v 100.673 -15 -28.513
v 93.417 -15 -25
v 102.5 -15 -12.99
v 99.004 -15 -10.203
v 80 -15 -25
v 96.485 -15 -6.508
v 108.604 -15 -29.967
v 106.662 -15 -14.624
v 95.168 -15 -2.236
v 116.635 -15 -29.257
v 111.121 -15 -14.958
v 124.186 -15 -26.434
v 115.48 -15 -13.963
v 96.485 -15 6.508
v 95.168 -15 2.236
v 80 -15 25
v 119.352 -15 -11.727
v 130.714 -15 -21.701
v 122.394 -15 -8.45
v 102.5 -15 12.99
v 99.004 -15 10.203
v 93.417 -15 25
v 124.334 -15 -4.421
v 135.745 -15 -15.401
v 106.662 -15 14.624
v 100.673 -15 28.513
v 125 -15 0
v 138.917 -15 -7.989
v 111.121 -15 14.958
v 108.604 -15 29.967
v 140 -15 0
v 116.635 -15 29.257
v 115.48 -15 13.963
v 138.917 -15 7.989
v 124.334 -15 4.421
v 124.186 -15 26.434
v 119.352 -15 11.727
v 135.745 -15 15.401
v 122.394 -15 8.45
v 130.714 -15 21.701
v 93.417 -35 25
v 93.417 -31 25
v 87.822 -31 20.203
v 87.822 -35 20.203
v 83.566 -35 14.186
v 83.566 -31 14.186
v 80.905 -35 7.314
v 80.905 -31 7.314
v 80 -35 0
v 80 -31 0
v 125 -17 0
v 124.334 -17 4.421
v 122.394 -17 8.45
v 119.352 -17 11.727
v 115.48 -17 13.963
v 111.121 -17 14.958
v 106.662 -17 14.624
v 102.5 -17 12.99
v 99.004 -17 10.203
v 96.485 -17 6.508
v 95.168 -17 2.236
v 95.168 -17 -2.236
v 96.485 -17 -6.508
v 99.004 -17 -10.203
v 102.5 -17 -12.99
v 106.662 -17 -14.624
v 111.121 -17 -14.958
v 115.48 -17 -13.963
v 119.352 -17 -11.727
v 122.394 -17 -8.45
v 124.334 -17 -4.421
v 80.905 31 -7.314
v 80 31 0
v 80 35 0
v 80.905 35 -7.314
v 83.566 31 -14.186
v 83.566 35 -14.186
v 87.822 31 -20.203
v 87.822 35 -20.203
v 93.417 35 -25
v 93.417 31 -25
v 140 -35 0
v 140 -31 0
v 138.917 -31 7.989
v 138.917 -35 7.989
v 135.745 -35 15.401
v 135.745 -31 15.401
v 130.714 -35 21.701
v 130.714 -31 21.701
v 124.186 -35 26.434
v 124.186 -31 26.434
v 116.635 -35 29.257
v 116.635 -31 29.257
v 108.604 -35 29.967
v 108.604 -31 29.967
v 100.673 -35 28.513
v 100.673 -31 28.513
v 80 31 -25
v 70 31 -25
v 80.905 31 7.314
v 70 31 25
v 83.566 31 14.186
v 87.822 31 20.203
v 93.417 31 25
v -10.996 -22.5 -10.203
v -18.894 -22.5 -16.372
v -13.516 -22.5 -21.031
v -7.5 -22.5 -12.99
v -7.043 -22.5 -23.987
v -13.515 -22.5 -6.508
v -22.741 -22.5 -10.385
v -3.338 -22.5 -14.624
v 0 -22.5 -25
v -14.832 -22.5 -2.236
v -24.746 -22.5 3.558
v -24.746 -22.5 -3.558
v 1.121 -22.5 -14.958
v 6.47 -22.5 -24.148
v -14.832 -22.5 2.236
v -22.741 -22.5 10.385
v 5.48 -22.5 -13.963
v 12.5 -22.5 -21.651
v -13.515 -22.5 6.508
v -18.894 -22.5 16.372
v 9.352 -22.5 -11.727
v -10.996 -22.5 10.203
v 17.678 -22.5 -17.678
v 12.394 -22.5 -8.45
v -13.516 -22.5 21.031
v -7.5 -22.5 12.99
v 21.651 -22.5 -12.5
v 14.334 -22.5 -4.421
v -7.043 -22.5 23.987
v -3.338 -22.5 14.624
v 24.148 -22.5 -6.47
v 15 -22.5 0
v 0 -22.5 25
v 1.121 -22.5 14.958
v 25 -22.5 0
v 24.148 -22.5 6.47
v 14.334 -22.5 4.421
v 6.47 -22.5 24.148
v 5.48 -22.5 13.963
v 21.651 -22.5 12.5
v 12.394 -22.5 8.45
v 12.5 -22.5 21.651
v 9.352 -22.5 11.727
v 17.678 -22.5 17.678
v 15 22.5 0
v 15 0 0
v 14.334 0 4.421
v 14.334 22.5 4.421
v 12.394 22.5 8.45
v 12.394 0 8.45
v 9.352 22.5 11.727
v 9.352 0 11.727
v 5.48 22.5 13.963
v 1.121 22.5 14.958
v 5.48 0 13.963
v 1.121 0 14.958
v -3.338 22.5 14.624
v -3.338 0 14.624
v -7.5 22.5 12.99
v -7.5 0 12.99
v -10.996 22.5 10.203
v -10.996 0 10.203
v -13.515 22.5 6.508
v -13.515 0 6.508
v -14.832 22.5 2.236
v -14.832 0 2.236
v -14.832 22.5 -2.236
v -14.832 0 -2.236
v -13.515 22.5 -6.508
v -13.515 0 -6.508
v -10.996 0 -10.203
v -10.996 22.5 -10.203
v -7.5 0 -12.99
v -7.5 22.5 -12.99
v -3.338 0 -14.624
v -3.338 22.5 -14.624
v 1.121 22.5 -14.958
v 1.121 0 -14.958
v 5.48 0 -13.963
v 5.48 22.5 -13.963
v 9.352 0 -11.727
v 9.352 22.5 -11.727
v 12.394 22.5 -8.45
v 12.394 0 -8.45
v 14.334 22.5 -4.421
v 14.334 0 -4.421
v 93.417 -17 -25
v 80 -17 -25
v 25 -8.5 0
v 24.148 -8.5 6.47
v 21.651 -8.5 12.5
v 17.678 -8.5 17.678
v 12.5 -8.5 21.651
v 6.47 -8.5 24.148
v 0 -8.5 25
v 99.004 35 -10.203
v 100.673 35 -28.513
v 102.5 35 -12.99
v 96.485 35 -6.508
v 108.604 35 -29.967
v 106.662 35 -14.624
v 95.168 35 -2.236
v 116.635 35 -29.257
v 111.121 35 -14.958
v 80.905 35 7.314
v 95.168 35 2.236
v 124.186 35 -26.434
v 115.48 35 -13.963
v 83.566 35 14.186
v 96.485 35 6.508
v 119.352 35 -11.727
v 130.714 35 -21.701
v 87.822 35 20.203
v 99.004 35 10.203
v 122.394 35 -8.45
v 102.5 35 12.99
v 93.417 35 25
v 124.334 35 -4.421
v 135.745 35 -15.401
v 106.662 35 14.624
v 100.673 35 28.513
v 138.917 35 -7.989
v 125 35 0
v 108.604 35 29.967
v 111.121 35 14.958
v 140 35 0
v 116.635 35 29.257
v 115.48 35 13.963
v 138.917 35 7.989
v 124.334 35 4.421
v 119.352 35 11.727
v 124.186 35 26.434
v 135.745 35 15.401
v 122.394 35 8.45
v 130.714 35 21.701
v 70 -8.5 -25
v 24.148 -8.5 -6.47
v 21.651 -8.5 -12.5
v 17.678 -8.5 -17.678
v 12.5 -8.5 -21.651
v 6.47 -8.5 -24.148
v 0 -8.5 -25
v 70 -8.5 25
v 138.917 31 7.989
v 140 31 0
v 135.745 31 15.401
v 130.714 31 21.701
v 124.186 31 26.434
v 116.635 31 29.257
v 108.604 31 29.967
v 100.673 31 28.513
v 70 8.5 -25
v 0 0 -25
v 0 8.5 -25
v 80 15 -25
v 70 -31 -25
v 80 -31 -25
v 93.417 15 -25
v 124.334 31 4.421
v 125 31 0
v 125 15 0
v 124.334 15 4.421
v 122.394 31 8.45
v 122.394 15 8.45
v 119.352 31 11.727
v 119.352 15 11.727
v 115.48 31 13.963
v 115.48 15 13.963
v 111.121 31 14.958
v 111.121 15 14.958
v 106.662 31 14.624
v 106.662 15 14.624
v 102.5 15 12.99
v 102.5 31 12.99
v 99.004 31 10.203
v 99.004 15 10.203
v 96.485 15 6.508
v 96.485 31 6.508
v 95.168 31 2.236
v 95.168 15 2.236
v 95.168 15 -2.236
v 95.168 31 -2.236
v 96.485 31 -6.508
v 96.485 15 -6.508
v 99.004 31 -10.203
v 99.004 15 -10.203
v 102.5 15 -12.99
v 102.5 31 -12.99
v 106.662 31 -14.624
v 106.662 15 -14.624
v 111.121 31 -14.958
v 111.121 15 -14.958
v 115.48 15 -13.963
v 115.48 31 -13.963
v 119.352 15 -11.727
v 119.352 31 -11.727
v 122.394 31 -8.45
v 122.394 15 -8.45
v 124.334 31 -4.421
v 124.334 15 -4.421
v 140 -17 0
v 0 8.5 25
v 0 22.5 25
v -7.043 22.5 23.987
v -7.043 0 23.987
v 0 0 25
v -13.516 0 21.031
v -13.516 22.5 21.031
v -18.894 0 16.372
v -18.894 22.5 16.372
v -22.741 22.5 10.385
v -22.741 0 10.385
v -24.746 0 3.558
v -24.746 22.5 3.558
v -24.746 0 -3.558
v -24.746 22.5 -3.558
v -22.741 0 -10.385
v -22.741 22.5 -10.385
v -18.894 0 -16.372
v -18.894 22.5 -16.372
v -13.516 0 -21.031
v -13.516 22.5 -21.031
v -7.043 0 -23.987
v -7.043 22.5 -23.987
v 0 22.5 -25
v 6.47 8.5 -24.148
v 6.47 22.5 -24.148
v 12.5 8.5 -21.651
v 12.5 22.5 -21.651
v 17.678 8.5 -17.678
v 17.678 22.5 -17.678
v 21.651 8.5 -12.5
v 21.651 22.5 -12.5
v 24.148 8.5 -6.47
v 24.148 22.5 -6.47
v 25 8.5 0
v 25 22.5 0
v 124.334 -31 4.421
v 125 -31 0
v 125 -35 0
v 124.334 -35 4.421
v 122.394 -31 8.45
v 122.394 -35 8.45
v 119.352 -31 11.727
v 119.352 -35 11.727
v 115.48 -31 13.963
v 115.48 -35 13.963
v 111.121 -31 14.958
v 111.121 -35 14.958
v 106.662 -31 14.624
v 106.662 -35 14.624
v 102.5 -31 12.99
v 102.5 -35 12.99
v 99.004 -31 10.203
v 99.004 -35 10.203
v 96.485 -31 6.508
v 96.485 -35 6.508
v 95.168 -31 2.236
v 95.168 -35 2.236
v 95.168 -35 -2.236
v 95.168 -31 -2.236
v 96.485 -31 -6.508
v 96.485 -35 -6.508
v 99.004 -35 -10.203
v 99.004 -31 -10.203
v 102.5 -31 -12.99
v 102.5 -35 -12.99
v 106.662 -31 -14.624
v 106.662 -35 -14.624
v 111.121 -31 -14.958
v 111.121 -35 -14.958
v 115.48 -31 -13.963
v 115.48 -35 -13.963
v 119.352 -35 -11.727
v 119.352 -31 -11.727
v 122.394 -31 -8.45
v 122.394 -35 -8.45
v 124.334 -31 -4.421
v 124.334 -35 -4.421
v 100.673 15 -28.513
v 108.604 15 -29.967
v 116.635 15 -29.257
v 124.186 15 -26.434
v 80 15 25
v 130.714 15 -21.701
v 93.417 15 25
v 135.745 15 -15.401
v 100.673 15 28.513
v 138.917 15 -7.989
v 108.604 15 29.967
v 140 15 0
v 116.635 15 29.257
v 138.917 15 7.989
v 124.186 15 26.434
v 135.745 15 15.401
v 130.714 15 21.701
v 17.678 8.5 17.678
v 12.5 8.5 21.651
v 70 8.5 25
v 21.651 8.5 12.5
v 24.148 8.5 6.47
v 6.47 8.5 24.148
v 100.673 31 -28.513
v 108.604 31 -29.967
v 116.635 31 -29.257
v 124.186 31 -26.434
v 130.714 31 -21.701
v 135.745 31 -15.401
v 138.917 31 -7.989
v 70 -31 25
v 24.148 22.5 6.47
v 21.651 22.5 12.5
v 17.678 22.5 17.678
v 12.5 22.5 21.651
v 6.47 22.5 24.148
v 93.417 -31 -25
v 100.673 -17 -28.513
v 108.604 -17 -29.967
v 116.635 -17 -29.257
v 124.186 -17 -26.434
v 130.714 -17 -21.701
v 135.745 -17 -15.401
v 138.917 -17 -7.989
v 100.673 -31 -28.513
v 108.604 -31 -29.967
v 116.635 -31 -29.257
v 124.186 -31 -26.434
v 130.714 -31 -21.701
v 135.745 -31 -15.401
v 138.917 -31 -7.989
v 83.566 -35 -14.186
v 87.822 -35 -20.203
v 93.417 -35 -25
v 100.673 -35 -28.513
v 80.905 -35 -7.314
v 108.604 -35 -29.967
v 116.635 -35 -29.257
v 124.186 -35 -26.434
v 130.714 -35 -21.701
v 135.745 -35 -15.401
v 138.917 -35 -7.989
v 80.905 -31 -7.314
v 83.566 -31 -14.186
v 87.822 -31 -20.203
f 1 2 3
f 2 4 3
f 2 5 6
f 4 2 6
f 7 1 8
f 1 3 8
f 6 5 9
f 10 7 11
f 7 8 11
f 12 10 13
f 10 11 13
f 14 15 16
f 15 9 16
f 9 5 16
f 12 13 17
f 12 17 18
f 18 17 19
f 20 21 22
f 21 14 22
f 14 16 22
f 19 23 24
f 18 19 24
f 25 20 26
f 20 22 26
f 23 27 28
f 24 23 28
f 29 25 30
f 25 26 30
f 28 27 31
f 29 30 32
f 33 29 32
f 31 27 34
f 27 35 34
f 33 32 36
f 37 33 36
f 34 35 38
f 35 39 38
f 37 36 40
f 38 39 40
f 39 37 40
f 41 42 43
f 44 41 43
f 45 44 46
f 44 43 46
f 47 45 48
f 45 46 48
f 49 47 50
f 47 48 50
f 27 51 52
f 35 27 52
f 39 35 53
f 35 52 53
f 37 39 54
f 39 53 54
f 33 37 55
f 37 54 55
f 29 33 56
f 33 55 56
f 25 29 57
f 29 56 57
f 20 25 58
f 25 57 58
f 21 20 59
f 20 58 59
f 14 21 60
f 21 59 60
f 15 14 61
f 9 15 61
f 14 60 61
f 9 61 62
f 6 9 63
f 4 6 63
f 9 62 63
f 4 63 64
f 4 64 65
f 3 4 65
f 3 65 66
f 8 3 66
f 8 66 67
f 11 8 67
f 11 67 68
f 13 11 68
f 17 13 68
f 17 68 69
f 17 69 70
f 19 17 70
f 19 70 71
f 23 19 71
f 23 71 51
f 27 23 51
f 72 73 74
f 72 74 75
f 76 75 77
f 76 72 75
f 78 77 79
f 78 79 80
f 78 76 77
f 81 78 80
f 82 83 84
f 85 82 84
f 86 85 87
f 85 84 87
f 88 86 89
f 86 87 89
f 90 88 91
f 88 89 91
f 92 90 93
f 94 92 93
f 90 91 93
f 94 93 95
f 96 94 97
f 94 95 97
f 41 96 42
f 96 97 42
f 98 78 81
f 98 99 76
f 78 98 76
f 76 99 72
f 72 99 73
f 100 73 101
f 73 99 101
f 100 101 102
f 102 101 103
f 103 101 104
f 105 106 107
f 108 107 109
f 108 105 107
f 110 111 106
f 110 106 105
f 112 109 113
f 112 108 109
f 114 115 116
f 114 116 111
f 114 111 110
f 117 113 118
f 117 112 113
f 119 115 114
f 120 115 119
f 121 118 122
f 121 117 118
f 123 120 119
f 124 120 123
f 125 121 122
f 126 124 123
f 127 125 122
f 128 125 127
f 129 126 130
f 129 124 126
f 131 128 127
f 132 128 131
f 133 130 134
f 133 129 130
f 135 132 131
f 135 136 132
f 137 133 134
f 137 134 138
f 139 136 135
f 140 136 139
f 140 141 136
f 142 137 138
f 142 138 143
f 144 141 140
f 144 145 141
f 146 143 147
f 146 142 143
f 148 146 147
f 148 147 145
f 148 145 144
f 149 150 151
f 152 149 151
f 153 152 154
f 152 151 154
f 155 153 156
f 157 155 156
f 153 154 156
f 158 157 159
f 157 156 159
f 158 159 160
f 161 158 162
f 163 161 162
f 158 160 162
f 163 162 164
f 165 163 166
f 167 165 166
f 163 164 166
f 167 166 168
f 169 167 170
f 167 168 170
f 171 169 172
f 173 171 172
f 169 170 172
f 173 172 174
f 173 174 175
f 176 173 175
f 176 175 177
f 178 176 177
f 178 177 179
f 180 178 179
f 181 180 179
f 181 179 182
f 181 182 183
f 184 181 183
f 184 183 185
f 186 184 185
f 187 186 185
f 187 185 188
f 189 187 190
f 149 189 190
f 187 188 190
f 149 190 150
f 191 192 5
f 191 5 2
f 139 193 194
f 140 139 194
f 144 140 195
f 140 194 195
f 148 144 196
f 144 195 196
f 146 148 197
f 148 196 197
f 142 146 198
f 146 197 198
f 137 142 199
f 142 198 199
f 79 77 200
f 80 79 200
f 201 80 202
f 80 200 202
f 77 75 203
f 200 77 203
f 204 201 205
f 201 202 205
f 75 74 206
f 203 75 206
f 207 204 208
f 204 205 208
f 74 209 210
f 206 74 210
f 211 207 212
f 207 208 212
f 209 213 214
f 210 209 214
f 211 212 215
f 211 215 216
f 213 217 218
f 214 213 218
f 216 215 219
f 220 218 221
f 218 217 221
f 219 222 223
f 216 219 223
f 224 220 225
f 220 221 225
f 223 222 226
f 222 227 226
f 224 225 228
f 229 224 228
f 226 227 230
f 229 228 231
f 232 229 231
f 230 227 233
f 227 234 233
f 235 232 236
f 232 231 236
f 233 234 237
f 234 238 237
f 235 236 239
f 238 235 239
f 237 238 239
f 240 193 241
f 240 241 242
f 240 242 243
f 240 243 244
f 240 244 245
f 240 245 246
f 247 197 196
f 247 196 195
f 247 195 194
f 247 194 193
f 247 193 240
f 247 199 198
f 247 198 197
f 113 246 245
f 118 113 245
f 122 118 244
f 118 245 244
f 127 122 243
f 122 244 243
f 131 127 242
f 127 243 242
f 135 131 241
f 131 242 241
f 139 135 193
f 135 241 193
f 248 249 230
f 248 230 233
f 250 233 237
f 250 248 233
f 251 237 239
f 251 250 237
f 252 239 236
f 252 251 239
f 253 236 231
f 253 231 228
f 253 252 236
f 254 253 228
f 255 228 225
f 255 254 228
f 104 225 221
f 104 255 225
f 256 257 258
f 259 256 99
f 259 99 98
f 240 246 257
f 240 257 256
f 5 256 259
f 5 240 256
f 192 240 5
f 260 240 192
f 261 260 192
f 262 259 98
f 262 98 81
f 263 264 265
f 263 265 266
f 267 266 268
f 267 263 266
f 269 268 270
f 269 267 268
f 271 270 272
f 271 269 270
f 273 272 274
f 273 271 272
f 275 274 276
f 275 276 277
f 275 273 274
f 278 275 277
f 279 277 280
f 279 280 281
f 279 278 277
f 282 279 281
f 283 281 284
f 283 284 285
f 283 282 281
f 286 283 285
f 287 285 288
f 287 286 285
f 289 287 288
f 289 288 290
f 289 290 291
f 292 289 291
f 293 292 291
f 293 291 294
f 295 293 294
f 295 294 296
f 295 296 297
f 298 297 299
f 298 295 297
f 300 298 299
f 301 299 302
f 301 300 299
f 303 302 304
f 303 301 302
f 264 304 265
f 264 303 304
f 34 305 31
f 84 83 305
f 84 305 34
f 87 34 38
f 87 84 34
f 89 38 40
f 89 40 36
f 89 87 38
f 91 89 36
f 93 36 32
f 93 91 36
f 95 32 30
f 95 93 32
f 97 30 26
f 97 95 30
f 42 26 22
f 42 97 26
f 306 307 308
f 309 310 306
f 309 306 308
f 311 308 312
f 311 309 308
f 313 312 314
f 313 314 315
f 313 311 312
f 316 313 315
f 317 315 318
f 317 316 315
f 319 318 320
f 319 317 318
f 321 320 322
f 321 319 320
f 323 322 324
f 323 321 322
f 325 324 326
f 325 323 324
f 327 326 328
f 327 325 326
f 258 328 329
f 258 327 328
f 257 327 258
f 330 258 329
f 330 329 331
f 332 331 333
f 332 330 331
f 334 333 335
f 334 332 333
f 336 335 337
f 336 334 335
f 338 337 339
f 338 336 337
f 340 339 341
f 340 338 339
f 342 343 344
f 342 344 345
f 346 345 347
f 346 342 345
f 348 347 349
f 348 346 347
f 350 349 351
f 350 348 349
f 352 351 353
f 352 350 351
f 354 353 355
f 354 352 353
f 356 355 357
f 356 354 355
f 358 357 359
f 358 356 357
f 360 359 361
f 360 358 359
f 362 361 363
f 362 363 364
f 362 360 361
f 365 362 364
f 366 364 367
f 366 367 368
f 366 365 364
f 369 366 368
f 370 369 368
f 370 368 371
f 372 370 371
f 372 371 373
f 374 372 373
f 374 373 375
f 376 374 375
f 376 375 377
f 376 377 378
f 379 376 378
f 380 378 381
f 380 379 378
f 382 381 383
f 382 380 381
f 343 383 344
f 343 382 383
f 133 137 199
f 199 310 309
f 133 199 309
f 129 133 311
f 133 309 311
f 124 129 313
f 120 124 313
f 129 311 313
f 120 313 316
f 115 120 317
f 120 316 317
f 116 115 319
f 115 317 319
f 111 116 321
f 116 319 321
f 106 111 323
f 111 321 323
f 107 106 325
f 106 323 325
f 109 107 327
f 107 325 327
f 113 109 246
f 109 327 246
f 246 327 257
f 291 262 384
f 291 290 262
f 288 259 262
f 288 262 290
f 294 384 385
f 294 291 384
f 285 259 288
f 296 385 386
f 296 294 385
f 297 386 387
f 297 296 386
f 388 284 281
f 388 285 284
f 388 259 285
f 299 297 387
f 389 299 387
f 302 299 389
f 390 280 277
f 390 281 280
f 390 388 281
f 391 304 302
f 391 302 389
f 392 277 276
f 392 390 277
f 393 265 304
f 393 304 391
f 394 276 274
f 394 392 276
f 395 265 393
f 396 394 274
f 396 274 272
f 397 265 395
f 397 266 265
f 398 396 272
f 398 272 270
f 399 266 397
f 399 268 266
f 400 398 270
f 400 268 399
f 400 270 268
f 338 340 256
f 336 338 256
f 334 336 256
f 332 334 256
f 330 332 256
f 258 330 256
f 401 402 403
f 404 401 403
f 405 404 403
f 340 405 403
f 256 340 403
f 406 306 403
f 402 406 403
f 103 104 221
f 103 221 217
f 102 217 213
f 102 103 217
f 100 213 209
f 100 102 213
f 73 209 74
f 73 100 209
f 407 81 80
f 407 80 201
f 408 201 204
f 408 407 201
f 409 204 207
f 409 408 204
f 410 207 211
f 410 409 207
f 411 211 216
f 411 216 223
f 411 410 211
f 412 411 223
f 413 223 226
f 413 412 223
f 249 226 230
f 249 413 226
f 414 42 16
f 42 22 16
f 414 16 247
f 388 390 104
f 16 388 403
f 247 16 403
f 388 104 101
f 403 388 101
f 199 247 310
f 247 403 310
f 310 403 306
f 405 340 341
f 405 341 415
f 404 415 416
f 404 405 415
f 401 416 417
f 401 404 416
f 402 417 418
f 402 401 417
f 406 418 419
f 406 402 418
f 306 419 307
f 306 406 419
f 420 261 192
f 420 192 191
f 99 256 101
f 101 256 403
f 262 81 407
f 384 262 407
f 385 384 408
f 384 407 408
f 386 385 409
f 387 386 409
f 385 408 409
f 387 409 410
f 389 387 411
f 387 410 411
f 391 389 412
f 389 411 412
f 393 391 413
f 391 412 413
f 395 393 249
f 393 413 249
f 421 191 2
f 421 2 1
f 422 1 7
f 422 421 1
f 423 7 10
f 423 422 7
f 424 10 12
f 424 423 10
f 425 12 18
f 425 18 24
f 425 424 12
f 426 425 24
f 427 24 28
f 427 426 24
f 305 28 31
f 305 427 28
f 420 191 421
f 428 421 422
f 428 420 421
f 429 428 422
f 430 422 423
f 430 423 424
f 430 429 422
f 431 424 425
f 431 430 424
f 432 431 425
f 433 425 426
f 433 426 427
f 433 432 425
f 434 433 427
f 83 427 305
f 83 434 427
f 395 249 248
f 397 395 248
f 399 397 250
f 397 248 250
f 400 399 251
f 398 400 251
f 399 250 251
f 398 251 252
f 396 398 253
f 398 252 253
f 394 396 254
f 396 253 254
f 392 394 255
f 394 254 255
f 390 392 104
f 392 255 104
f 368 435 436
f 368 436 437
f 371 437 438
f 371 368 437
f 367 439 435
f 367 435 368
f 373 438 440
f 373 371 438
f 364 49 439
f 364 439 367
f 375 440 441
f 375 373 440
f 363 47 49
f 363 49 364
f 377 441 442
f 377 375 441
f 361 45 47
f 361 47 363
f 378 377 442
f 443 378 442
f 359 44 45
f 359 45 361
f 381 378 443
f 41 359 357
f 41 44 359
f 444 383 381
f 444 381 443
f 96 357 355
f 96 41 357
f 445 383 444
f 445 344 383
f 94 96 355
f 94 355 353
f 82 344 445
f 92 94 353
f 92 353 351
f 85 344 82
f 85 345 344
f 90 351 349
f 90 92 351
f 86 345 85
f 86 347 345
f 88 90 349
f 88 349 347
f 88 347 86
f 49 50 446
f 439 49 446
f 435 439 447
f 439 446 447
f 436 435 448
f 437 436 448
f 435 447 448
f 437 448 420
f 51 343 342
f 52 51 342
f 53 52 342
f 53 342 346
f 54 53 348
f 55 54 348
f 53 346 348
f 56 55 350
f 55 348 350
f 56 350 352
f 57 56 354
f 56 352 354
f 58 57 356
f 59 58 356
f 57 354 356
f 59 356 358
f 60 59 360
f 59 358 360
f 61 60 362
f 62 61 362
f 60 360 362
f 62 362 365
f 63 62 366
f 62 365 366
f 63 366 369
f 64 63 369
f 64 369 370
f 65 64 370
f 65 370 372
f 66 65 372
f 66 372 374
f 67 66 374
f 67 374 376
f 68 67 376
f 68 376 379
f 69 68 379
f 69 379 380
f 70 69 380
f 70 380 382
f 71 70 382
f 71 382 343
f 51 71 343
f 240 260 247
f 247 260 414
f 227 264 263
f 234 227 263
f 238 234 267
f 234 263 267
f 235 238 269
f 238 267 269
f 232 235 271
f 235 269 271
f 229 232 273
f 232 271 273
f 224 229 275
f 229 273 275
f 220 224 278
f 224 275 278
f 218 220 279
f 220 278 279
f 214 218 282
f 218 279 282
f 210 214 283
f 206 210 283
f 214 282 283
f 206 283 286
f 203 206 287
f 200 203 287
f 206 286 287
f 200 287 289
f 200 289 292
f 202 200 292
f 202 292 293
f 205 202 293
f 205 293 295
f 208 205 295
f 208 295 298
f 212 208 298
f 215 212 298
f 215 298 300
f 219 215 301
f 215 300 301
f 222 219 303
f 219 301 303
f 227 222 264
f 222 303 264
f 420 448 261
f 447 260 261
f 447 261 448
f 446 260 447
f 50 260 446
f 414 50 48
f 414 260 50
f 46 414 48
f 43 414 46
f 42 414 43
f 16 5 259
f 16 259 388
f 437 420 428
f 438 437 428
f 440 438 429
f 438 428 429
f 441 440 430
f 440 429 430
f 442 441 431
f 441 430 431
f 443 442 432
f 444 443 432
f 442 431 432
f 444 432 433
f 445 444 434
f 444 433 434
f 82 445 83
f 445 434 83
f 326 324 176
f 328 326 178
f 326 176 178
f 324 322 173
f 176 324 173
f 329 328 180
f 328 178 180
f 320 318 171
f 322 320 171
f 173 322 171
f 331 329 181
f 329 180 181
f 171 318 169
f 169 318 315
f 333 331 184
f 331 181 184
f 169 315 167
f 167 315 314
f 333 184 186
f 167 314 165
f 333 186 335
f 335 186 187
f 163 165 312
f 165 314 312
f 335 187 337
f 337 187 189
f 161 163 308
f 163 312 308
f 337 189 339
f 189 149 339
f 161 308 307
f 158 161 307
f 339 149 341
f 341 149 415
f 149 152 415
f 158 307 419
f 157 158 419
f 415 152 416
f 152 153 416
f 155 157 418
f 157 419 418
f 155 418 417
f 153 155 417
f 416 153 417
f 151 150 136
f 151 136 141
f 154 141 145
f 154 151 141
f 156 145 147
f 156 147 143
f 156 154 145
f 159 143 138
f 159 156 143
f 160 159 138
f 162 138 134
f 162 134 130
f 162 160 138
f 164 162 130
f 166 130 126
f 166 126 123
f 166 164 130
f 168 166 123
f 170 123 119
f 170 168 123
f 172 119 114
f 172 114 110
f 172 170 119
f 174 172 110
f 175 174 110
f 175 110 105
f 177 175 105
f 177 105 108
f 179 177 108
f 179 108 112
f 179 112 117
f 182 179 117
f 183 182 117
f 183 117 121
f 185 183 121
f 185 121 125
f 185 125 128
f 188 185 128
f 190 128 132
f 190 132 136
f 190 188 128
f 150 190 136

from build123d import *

# Parameters (mm, degrees)
F0_R      = 15
F1_DEPTH  = 22.5
F2_DEPTH  = 8.5
F5_W      = 10
F5_H      = 50
F6_DEPTH  = 31
F8_R      = 15
F9_DEPTH  = 16
F10_DEPTH = 14
F12_DEPTH = 4


# Not quite as in the source:
# - a pattern or mirror of a feature is missing from the dataset's text; its kind, count and spacing are read off the source's solid


with BuildPart() as f1:
    # F0 (on Front) → F1 (new body, symmetric)
    with BuildSketch(Plane.XZ):
        with BuildLine():
            ThreePointArc((0, -25), (17.6776695297, -17.6776695297), (25, 0))
            ThreePointArc((25, 0), (17.6776695297, 17.6776695297), (0, 25))
            ThreePointArc((0, 25), (-25, 0), (0, -25))
        make_face()
        Circle(F0_R, mode=Mode.SUBTRACT)
    extrude(amount=F1_DEPTH, both=True)

    # F0 (on Front) → F2 (join, symmetric)
    with BuildSketch(Plane.XZ):
        with BuildLine():
            ThreePointArc((0, 25), (17.6776695297, 17.6776695297), (25, 0))
            ThreePointArc((25, 0), (17.6776695297, -17.6776695297), (0, -25))
            Line((0, -25), (70, -25))
            Line((70, -25), (70, 25))
            Line((70, 25), (0, 25))
        make_face()
    extrude(amount=F2_DEPTH, both=True)

    # F5 (on Front) → F6 (join, symmetric)
    with BuildSketch(Plane.XZ):
        with Locations((75, 0)):
            Rectangle(F5_W, F5_H)
    extrude(amount=F6_DEPTH, both=True)

    # F8 (on face) → F9 (join)
    with BuildSketch(Plane.XZ.offset(31)):
        with BuildLine():
            Line((93.4168760482, 25), (80, 25))
            Line((80, 25), (80, 0))
            ThreePointArc((80, 0), (83.5661796315, 14.1863716546), (93.4168760482, 25))
        make_face()
        with BuildLine():
            ThreePointArc((93.4168760482, 25), (83.5661796315, 14.1863716546), (80, 0))
            ThreePointArc((80, 0), (83.5661796315, -14.1863716546), (93.4168760482, -25))
            ThreePointArc((93.4168760482, -25), (124.1863716546, -26.4338203685), (140, 0))
            ThreePointArc((140, 0), (124.1863716546, 26.4338203685), (93.4168760482, 25))
        make_face()
        with Locations((110, 0)):
            Circle(F8_R, mode=Mode.SUBTRACT)
        with BuildLine():
            ThreePointArc((93.4168760482, -25), (83.5661796315, -14.1863716546), (80, 0))
            Line((80, 0), (80, -25))
            Line((80, -25), (93.4168760482, -25))
        make_face()
    f9 = extrude(amount=-F9_DEPTH)

    # F9_copies: F9 across plane
    add(f9.mirror(Plane.ZX))

    # F8 (on face) → F10 (join)
    with BuildSketch(Plane.XZ.offset(31)):
        with BuildLine():
            Line((93.4168760482, 25), (80, 25))
            Line((80, 25), (80, 0))
            ThreePointArc((80, 0), (83.5661796315, 14.1863716546), (93.4168760482, 25))
        make_face()
        with BuildLine():
            ThreePointArc((93.4168760482, -25), (83.5661796315, -14.1863716546), (80, 0))
            Line((80, 0), (80, -25))
            Line((80, -25), (93.4168760482, -25))
        make_face()
        with BuildLine():
            ThreePointArc((93.4168760482, 25), (83.5661796315, 14.1863716546), (80, 0))
            ThreePointArc((80, 0), (83.5661796315, -14.1863716546), (93.4168760482, -25))
            ThreePointArc((93.4168760482, -25), (124.1863716546, -26.4338203685), (140, 0))
            ThreePointArc((140, 0), (124.1863716546, 26.4338203685), (93.4168760482, 25))
        make_face()
        with Locations((110, 0)):
            Circle(F8_R, mode=Mode.SUBTRACT)
    extrude(amount=-F10_DEPTH)

    # F8 (on face) → F12 (join)
    with BuildSketch(Plane.XZ.offset(31)):
        with BuildLine():
            ThreePointArc((93.4168760482, 25), (83.5661796315, 14.1863716546), (80, 0))
            ThreePointArc((80, 0), (83.5661796315, -14.1863716546), (93.4168760482, -25))
            ThreePointArc((93.4168760482, -25), (124.1863716546, -26.4338203685), (140, 0))
            ThreePointArc((140, 0), (124.1863716546, 26.4338203685), (93.4168760482, 25))
        make_face()
        with Locations((110, 0)):
            Circle(F8_R, mode=Mode.SUBTRACT)
    f12 = extrude(amount=F12_DEPTH)

    # F12_copies: F12 across plane
    add(f12.mirror(Plane.ZX))


solid = f1.part
